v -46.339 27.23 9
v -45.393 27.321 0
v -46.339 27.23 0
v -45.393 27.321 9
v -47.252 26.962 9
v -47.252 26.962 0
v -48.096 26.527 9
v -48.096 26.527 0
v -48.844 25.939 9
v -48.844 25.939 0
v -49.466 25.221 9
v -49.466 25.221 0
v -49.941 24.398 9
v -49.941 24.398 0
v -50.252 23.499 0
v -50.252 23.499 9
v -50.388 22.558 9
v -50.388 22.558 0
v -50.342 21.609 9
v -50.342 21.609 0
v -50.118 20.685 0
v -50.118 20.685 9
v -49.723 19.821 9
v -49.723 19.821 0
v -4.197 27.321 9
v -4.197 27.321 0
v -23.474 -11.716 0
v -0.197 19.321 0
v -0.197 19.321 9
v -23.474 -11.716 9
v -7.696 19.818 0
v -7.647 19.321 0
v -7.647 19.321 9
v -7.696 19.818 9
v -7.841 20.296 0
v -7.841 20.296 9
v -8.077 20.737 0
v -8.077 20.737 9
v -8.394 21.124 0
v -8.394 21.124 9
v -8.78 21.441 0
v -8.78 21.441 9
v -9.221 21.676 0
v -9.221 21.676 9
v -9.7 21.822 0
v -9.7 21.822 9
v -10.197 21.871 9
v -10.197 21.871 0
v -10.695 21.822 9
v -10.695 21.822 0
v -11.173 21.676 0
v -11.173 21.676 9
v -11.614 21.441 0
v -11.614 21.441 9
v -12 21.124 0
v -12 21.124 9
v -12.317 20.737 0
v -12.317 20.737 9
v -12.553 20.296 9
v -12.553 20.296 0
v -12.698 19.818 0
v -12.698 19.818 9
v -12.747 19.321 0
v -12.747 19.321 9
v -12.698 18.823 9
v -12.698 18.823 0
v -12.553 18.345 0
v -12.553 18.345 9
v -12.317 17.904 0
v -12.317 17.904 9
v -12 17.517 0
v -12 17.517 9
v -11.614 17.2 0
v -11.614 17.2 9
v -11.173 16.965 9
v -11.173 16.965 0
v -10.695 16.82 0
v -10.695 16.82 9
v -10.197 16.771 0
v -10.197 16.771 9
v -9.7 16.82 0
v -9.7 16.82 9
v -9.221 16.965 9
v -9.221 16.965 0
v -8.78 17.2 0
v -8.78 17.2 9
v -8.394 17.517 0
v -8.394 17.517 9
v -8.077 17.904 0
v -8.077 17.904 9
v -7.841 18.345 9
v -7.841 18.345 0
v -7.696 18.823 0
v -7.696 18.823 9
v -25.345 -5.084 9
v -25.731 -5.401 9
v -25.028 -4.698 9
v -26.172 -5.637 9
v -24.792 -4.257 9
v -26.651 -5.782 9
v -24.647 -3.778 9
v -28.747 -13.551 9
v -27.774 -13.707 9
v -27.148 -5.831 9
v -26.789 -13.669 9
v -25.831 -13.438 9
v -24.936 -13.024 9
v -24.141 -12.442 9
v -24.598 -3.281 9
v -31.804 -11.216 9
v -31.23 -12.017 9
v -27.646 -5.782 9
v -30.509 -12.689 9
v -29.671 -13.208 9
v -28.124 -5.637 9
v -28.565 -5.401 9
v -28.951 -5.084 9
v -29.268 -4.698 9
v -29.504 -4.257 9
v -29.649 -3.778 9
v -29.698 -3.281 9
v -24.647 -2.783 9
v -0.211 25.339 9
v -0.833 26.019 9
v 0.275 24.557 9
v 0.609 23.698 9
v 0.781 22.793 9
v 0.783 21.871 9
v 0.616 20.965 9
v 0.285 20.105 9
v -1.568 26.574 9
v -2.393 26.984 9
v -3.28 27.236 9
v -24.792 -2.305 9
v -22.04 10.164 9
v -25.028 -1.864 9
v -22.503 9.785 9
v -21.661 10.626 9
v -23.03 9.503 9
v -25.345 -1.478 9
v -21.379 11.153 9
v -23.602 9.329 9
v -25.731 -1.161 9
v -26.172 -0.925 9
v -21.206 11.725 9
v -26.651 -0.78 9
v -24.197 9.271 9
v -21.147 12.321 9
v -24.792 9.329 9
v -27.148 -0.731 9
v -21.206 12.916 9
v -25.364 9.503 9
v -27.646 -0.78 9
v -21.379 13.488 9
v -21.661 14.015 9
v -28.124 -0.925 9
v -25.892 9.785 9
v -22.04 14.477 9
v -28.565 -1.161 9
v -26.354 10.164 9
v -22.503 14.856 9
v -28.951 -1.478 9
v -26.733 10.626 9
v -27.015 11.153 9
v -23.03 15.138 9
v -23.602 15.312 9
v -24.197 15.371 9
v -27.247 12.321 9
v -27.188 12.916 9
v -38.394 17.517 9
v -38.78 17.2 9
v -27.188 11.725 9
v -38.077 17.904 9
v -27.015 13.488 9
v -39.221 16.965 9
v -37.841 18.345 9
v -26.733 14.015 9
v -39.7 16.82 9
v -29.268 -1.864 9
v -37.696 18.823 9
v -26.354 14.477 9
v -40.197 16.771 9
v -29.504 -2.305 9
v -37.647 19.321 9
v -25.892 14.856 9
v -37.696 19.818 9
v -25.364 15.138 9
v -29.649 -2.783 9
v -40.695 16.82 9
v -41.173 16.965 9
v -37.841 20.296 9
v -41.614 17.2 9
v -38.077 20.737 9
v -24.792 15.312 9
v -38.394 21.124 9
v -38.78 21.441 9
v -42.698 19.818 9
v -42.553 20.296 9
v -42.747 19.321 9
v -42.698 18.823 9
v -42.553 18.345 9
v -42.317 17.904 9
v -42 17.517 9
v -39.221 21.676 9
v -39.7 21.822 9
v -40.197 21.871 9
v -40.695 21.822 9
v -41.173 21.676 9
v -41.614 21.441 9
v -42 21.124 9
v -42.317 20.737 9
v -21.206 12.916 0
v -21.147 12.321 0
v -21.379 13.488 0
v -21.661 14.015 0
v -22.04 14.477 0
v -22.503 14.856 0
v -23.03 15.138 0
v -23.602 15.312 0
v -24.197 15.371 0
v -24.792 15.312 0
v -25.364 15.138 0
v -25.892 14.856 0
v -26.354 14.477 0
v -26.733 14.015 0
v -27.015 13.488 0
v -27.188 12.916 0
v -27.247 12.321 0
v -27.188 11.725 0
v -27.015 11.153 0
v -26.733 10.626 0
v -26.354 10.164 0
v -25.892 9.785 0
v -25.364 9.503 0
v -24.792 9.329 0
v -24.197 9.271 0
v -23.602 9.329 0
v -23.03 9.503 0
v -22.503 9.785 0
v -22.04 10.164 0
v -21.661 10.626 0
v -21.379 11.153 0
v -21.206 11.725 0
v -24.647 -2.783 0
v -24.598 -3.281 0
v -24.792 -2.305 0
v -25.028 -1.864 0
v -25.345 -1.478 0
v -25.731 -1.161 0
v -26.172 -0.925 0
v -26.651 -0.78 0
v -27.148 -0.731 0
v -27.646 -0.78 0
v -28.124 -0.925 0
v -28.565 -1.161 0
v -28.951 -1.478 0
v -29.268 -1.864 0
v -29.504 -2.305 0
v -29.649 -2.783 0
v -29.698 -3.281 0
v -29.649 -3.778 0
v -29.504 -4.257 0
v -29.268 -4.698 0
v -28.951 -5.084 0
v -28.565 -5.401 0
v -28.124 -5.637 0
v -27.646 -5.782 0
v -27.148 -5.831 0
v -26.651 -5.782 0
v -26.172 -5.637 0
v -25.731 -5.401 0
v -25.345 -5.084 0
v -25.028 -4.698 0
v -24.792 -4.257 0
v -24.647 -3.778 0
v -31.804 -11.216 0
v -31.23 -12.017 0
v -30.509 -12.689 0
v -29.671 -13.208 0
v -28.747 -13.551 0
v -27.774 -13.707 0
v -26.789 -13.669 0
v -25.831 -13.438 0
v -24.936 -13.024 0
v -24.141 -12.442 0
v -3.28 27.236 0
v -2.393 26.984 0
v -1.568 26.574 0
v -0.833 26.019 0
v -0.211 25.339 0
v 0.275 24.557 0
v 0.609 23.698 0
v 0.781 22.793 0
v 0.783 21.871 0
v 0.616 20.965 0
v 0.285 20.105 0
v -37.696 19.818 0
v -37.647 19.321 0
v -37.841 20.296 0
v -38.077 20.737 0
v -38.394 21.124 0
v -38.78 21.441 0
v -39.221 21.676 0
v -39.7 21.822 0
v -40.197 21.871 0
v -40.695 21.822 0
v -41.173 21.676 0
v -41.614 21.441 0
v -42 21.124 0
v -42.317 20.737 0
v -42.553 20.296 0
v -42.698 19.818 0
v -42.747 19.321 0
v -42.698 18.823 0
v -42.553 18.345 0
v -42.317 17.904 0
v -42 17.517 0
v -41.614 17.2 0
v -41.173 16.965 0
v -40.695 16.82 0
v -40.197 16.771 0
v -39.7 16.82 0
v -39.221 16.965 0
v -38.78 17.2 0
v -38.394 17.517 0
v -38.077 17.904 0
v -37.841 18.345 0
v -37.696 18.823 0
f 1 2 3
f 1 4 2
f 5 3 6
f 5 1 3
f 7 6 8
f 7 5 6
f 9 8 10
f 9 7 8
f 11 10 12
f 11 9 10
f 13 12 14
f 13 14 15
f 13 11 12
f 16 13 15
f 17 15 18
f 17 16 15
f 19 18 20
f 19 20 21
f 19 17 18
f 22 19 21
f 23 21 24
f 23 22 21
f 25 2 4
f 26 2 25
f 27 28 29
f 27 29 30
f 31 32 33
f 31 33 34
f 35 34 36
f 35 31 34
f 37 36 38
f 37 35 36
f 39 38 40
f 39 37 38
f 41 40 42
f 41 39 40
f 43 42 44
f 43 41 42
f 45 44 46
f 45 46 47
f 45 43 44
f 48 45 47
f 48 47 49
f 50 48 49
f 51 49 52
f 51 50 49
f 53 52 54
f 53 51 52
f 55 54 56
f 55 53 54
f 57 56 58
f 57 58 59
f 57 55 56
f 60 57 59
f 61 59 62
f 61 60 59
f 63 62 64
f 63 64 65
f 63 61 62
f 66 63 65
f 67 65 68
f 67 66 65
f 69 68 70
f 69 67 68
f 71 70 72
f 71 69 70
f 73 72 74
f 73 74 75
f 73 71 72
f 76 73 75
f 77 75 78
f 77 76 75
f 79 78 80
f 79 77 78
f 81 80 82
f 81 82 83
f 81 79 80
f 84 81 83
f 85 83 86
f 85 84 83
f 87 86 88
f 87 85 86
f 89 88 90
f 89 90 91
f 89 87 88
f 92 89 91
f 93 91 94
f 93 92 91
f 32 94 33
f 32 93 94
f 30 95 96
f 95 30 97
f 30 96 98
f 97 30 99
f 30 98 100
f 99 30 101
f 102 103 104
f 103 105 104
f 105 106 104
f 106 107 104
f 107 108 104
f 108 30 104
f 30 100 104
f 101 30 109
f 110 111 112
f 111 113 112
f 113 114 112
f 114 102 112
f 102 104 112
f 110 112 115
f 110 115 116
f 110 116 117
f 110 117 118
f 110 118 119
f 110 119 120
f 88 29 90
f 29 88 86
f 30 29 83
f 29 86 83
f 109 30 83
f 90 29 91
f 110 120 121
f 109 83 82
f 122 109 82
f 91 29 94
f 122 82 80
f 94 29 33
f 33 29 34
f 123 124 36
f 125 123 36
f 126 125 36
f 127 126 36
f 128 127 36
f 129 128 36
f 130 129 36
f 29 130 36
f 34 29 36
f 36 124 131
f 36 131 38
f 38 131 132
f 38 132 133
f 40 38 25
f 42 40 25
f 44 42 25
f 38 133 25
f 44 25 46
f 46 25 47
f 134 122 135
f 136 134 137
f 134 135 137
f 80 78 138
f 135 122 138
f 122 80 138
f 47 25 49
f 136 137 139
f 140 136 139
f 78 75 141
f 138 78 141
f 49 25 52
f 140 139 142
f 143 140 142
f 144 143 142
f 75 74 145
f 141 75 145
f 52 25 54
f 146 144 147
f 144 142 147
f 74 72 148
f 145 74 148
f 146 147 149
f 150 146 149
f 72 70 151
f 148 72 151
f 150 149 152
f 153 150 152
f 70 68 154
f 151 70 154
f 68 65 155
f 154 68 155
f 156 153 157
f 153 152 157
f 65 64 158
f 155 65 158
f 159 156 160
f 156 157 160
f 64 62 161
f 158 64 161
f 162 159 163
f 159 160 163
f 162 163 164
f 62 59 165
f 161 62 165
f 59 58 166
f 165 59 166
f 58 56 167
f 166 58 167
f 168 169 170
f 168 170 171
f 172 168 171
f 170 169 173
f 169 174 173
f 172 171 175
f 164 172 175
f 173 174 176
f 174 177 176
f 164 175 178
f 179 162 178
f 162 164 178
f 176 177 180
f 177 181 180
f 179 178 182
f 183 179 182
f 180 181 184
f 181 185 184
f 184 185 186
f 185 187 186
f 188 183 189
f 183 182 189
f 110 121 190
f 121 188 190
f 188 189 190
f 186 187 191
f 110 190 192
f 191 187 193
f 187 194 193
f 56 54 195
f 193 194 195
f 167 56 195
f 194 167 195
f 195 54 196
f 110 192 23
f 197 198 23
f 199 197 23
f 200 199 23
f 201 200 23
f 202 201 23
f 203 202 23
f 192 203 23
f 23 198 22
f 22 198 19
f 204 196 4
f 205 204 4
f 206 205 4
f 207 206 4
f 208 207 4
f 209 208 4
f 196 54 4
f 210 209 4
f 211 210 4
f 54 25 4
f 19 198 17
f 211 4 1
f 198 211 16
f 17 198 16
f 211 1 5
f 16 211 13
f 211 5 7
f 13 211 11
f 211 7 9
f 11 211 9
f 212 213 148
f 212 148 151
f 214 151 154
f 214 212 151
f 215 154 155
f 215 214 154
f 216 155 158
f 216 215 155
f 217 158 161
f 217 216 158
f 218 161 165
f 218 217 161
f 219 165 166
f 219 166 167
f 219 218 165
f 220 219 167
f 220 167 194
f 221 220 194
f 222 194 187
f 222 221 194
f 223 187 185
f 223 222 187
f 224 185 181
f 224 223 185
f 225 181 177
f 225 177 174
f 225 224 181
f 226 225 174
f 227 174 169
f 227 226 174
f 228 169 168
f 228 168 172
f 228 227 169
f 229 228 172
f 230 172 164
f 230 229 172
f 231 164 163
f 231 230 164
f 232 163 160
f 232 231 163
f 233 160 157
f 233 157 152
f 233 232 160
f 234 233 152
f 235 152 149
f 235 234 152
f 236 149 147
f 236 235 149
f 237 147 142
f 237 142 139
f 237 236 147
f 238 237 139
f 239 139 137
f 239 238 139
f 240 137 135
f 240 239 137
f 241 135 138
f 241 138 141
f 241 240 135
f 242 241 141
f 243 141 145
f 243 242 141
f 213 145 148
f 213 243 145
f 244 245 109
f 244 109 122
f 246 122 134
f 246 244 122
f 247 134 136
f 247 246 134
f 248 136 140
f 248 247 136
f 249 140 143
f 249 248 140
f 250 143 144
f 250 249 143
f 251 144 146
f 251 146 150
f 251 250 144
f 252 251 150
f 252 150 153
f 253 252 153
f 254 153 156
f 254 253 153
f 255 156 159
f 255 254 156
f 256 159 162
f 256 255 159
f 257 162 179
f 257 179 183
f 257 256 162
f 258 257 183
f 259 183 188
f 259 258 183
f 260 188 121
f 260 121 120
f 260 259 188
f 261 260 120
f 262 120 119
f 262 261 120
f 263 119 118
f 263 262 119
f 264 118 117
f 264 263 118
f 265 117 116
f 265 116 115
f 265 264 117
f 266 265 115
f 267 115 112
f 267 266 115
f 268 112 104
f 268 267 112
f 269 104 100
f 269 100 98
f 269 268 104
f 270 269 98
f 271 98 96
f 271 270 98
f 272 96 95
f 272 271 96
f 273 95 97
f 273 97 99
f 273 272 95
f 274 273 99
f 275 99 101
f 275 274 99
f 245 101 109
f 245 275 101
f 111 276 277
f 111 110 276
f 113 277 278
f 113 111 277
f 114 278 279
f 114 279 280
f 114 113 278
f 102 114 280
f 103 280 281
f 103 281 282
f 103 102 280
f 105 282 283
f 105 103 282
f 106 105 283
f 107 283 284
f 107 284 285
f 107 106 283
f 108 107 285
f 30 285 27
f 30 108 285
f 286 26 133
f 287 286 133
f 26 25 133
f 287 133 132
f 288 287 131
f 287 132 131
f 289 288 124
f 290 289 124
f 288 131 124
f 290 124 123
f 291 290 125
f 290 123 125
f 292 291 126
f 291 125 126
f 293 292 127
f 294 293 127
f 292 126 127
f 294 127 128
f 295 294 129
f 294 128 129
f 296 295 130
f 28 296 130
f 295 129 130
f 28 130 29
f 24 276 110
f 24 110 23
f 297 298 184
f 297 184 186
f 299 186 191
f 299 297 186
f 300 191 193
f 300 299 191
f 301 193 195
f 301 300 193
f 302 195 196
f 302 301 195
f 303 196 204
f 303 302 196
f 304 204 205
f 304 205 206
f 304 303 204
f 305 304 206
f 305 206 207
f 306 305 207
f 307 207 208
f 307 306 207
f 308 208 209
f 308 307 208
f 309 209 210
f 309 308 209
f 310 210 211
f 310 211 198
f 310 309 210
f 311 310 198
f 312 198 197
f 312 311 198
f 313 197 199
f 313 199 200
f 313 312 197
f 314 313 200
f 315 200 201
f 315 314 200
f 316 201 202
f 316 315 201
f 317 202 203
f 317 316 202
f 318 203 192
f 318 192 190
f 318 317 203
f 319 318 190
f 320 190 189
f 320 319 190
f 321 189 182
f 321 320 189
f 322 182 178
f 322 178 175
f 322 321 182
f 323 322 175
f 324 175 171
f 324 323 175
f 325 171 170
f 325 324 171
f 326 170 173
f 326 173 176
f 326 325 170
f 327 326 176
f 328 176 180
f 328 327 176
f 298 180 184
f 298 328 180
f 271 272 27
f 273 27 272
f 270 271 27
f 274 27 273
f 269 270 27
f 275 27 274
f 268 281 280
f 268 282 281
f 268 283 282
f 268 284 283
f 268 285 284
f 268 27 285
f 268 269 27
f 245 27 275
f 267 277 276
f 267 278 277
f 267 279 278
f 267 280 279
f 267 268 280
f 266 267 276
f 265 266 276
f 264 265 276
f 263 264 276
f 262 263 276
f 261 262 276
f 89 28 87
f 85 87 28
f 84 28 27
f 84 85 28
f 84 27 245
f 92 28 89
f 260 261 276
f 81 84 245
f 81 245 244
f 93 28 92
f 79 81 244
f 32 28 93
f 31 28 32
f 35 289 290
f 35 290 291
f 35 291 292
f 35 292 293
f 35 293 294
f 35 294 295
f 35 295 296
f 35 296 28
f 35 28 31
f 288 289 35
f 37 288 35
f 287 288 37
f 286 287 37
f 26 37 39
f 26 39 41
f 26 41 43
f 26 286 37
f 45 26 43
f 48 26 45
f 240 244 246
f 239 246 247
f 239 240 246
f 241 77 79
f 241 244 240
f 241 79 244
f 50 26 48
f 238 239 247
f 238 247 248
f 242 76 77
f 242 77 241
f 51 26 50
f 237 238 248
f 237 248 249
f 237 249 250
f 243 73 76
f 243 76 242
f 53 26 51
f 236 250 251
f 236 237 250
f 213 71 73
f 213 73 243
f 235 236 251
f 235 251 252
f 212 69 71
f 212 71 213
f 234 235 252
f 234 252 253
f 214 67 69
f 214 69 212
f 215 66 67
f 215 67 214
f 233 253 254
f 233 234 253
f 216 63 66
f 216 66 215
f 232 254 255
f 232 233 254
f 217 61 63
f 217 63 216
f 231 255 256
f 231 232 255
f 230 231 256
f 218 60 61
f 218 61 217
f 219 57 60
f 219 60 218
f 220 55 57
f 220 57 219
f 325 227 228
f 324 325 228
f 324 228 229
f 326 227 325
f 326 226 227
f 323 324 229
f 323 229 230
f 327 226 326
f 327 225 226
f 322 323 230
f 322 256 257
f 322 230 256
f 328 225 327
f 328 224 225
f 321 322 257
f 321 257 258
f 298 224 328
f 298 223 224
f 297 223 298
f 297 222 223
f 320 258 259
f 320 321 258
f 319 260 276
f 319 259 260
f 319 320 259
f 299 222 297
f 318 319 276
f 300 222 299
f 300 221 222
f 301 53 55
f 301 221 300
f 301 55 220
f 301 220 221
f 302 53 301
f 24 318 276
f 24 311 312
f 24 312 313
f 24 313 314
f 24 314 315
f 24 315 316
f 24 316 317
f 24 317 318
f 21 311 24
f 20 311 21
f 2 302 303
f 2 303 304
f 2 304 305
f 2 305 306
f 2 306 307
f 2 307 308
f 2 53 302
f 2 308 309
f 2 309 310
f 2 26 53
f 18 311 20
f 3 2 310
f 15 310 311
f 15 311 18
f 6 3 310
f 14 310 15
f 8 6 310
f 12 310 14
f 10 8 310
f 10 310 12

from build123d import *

# Parameters (mm, degrees)
SKETCH_1_R      = 2.55
SKETCH_1_R_2    = 3.05
EXTRUDE_1_DEPTH = 9
FILLET_1_R      = 5


with BuildPart() as part:
    # 草图1 → 凸台-拉伸1 (new body)
    with BuildSketch(Plane.XY):
        Polygon((-54.053450796, 27.320514858), (5.802955665, 27.320514858), (-28.018037849, -17.774143161), align=None)
        with Locations((-40.197044335, 19.320514858)):
            Circle(SKETCH_1_R, mode=Mode.SUBTRACT)
        with Locations((-27.148108815, -3.280904448)):
            Circle(SKETCH_1_R, mode=Mode.SUBTRACT)
        with Locations((-10.197044335, 19.320514858)):
            Circle(SKETCH_1_R, mode=Mode.SUBTRACT)
        with Locations((-24.197044335, 12.320514858)):
            Circle(SKETCH_1_R_2, mode=Mode.SUBTRACT)
    extrude(amount=EXTRUDE_1_DEPTH)

    # 圆角1
    fillet_1_edges = [part.edges().sort_by_distance(p)[0] for p in [
        (-54.053450796, 27.320514858, 4.5),
        (5.802955665, 27.320514858, 4.5),
        (-28.018037849, -17.774143161, 4.5),
    ]]
    fillet(fillet_1_edges, radius=FILLET_1_R)


solid = part.part
